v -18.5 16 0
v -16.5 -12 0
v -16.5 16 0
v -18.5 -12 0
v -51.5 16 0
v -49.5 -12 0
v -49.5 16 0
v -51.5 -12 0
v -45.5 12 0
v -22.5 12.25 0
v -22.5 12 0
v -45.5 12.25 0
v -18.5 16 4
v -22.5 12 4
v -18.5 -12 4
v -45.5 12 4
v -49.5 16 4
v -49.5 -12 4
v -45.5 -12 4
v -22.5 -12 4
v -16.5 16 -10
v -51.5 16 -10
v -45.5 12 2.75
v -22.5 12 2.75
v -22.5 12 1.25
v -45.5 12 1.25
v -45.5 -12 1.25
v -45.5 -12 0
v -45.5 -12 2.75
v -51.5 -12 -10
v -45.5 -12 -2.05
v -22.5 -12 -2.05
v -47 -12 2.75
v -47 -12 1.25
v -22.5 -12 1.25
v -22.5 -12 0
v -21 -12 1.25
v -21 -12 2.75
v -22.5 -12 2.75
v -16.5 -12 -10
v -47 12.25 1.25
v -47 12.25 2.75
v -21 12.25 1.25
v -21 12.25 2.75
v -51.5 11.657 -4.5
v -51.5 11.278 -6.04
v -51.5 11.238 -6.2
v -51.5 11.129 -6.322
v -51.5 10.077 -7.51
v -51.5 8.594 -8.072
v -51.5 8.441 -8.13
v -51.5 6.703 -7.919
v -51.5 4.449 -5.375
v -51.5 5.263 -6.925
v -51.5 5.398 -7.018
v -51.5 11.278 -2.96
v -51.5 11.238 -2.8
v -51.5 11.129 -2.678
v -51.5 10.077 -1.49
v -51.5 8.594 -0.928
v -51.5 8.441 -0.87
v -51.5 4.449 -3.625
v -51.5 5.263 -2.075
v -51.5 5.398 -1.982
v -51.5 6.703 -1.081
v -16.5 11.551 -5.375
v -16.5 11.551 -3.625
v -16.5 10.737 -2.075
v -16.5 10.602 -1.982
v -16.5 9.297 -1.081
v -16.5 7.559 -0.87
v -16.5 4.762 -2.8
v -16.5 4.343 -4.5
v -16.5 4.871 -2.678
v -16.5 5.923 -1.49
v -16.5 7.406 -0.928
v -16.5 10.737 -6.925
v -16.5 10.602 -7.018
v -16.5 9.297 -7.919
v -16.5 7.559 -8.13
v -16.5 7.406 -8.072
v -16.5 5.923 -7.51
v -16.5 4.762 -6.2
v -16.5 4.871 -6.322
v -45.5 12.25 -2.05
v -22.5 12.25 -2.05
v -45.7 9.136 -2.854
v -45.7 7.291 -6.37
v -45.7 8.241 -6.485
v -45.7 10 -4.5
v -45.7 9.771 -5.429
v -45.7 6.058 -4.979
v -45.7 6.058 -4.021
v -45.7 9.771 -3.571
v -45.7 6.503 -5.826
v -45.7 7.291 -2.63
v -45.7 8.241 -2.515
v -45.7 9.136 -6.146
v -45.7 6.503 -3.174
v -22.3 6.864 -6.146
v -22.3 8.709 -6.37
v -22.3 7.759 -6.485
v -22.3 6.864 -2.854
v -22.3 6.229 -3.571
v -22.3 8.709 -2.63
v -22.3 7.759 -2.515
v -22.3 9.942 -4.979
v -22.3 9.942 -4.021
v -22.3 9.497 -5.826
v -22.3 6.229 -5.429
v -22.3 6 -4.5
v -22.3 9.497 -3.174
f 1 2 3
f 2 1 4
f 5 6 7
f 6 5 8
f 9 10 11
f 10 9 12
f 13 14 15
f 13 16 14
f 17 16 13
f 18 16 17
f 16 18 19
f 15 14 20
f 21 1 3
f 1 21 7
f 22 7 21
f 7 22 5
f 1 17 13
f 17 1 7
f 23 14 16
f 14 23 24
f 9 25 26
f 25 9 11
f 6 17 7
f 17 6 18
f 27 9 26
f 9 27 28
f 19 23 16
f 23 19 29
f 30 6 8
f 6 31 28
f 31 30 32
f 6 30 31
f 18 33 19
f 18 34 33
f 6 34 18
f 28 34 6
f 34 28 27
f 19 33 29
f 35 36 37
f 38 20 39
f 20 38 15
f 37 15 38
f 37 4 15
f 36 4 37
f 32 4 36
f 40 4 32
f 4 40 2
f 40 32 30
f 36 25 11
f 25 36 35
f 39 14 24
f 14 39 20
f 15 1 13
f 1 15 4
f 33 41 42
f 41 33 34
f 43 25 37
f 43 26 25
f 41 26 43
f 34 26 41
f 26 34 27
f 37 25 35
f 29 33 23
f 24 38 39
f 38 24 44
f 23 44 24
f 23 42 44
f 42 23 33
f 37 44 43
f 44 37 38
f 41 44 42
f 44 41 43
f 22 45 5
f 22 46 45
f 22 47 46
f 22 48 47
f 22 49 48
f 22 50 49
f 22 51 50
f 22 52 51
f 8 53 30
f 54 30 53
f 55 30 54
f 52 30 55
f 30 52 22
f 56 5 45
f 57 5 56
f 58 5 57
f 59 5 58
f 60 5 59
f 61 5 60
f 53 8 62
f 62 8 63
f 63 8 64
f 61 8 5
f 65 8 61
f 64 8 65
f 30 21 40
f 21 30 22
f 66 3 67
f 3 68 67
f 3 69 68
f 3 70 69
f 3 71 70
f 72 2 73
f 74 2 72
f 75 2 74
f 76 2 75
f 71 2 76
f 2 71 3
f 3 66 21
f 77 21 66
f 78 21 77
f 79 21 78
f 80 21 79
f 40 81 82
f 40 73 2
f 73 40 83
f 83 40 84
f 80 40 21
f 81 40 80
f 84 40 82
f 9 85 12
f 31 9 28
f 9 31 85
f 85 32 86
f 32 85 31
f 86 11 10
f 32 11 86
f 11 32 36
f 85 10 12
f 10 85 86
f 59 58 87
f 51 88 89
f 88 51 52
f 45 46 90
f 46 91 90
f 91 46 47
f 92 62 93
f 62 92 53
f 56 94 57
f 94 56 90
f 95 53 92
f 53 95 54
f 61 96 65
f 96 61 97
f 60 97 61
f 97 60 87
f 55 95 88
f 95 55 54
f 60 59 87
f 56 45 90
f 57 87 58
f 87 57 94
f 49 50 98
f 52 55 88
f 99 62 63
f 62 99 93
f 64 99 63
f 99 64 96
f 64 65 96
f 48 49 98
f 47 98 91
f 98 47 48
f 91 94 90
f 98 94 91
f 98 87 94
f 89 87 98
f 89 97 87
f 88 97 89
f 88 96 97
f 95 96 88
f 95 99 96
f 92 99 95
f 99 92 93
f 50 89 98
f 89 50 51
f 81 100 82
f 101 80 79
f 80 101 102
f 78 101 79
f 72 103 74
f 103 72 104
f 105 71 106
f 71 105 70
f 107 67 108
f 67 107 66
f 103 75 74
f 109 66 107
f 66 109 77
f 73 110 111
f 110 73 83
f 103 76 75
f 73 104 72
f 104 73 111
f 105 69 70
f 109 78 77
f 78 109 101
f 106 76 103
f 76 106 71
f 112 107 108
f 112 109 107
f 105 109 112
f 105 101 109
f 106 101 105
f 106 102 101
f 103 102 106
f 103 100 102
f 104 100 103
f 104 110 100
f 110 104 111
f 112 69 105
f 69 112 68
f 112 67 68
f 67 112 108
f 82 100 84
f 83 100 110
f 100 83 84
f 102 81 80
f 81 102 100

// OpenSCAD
tolerance = 0.5;


module camholder() {
	 //color("red")cube([25,24,1],center=true);
 union(){
	 difference(){
	  union(){
	   translate([0,24/2+4/2,0])cube([29,4,4],center=true);
	   translate([25/2+4/2-1,4/2,0])cube([4,24+4,4],center=true);
	   translate([-25/2-4/2+1,4/2,0])cube([4,24+4,4],center=true);
	  }
	  color("blue")cube([25+2*tolerance,24+tolerance,1+tolerance],center=true);
	 }
	 difference() {
	  translate([0,2,7]) union() difference(){
			cube([35,28,10],center=true);
			translate([0,-2,-4]) color("red")cube([23,24+tolerance,2.1],center=true);
		 }
	translate([0,0,6.5]) group() {
		rotate([90,0,90]) translate([8,0,15.2]) cylinder(7,2,4,center=true);
		rotate([90,0,-90]) translate([-8,0,15.2]) cylinder(7,2,4,center=true);
	}
}
}
}


translate([-34,0,2])rotate([180,0,180])camholder();
